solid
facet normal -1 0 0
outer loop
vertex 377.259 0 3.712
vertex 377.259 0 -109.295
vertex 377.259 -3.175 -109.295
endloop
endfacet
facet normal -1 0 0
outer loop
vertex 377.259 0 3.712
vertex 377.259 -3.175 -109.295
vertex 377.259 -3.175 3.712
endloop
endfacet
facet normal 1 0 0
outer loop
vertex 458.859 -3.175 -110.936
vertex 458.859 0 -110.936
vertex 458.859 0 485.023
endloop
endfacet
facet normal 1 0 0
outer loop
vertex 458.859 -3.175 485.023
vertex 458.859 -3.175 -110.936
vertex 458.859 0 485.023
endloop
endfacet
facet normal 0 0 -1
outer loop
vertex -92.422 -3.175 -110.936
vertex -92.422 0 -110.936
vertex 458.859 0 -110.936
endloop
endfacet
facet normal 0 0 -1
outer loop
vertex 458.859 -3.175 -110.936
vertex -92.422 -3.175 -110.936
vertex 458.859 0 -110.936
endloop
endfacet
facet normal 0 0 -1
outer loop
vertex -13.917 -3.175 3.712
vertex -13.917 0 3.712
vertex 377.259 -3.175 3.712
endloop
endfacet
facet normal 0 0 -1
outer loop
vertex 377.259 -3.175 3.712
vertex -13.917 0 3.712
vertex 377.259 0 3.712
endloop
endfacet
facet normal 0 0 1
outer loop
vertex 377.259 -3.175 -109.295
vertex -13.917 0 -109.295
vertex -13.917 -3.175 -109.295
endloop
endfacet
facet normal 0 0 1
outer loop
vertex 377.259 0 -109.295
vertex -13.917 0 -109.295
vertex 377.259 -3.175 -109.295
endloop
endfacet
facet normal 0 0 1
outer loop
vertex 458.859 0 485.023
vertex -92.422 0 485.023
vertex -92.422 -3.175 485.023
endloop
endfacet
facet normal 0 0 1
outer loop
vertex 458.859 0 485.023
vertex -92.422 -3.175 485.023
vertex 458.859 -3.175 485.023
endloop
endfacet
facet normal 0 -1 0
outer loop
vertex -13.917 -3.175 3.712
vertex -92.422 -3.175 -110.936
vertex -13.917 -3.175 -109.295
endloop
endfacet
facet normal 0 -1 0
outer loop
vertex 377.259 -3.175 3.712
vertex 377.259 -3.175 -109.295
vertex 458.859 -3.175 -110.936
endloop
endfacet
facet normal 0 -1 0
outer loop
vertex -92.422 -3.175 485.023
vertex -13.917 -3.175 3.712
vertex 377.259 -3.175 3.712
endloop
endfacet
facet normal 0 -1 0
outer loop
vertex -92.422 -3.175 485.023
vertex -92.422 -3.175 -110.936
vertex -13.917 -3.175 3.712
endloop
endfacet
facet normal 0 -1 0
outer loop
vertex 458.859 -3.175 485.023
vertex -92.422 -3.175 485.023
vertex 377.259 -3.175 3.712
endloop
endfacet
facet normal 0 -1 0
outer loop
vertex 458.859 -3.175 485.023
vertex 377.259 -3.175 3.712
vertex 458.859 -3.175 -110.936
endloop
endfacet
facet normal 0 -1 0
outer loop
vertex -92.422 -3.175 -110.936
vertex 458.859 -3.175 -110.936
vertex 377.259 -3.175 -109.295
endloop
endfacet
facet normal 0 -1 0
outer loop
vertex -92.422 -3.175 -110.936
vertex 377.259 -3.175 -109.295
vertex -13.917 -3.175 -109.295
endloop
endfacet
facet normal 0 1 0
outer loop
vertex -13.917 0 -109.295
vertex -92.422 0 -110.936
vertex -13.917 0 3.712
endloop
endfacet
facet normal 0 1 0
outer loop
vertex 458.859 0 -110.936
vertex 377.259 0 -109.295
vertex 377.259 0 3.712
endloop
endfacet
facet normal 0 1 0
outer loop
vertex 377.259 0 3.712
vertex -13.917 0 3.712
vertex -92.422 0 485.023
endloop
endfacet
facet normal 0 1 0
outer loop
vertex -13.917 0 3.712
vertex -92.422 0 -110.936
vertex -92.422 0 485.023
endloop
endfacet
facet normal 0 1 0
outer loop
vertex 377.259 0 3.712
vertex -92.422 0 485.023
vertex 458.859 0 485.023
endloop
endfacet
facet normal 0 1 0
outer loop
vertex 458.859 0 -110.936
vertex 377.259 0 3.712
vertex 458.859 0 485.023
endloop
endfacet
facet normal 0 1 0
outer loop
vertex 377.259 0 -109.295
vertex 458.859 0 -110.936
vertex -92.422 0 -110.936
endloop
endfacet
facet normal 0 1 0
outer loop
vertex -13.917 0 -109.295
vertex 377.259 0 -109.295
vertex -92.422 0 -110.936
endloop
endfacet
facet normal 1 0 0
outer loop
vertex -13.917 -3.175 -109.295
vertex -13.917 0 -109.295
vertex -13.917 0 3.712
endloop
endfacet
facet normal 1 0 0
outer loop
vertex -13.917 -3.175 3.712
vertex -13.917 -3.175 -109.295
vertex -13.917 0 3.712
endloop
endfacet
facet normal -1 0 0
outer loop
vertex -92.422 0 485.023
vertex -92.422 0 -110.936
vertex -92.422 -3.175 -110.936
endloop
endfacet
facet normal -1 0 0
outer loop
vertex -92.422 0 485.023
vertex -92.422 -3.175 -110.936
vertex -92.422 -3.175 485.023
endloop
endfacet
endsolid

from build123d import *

# Parameters (mm, degrees)
F0_W          = 551.280781
F0_H          = 595.958948
F2_DEPTH      = 3.175
F1_W          = 391.17673
F1_H          = 113.006599
F3_DEPTH      = 25.4
F3_DEPTH_BACK = 25.4


with BuildPart() as f2:
    # F0 (on Front) → F2 (new body)
    with BuildSketch(Plane.XZ):
        with Locations((183.218337, 187.043697)):
            Rectangle(F0_W, F0_H)
    extrude(amount=F2_DEPTH)

    # F1 (on face) → F3 (cut, two sides)
    with BuildSketch(Plane.XZ) as f3_sk:
        with Locations((181.670889, -52.791416)):
            Rectangle(F1_W, F1_H)
    extrude(amount=F3_DEPTH, mode=Mode.SUBTRACT)
    extrude(f3_sk.sketch, amount=-F3_DEPTH_BACK, mode=Mode.SUBTRACT)


solid = f2.part
